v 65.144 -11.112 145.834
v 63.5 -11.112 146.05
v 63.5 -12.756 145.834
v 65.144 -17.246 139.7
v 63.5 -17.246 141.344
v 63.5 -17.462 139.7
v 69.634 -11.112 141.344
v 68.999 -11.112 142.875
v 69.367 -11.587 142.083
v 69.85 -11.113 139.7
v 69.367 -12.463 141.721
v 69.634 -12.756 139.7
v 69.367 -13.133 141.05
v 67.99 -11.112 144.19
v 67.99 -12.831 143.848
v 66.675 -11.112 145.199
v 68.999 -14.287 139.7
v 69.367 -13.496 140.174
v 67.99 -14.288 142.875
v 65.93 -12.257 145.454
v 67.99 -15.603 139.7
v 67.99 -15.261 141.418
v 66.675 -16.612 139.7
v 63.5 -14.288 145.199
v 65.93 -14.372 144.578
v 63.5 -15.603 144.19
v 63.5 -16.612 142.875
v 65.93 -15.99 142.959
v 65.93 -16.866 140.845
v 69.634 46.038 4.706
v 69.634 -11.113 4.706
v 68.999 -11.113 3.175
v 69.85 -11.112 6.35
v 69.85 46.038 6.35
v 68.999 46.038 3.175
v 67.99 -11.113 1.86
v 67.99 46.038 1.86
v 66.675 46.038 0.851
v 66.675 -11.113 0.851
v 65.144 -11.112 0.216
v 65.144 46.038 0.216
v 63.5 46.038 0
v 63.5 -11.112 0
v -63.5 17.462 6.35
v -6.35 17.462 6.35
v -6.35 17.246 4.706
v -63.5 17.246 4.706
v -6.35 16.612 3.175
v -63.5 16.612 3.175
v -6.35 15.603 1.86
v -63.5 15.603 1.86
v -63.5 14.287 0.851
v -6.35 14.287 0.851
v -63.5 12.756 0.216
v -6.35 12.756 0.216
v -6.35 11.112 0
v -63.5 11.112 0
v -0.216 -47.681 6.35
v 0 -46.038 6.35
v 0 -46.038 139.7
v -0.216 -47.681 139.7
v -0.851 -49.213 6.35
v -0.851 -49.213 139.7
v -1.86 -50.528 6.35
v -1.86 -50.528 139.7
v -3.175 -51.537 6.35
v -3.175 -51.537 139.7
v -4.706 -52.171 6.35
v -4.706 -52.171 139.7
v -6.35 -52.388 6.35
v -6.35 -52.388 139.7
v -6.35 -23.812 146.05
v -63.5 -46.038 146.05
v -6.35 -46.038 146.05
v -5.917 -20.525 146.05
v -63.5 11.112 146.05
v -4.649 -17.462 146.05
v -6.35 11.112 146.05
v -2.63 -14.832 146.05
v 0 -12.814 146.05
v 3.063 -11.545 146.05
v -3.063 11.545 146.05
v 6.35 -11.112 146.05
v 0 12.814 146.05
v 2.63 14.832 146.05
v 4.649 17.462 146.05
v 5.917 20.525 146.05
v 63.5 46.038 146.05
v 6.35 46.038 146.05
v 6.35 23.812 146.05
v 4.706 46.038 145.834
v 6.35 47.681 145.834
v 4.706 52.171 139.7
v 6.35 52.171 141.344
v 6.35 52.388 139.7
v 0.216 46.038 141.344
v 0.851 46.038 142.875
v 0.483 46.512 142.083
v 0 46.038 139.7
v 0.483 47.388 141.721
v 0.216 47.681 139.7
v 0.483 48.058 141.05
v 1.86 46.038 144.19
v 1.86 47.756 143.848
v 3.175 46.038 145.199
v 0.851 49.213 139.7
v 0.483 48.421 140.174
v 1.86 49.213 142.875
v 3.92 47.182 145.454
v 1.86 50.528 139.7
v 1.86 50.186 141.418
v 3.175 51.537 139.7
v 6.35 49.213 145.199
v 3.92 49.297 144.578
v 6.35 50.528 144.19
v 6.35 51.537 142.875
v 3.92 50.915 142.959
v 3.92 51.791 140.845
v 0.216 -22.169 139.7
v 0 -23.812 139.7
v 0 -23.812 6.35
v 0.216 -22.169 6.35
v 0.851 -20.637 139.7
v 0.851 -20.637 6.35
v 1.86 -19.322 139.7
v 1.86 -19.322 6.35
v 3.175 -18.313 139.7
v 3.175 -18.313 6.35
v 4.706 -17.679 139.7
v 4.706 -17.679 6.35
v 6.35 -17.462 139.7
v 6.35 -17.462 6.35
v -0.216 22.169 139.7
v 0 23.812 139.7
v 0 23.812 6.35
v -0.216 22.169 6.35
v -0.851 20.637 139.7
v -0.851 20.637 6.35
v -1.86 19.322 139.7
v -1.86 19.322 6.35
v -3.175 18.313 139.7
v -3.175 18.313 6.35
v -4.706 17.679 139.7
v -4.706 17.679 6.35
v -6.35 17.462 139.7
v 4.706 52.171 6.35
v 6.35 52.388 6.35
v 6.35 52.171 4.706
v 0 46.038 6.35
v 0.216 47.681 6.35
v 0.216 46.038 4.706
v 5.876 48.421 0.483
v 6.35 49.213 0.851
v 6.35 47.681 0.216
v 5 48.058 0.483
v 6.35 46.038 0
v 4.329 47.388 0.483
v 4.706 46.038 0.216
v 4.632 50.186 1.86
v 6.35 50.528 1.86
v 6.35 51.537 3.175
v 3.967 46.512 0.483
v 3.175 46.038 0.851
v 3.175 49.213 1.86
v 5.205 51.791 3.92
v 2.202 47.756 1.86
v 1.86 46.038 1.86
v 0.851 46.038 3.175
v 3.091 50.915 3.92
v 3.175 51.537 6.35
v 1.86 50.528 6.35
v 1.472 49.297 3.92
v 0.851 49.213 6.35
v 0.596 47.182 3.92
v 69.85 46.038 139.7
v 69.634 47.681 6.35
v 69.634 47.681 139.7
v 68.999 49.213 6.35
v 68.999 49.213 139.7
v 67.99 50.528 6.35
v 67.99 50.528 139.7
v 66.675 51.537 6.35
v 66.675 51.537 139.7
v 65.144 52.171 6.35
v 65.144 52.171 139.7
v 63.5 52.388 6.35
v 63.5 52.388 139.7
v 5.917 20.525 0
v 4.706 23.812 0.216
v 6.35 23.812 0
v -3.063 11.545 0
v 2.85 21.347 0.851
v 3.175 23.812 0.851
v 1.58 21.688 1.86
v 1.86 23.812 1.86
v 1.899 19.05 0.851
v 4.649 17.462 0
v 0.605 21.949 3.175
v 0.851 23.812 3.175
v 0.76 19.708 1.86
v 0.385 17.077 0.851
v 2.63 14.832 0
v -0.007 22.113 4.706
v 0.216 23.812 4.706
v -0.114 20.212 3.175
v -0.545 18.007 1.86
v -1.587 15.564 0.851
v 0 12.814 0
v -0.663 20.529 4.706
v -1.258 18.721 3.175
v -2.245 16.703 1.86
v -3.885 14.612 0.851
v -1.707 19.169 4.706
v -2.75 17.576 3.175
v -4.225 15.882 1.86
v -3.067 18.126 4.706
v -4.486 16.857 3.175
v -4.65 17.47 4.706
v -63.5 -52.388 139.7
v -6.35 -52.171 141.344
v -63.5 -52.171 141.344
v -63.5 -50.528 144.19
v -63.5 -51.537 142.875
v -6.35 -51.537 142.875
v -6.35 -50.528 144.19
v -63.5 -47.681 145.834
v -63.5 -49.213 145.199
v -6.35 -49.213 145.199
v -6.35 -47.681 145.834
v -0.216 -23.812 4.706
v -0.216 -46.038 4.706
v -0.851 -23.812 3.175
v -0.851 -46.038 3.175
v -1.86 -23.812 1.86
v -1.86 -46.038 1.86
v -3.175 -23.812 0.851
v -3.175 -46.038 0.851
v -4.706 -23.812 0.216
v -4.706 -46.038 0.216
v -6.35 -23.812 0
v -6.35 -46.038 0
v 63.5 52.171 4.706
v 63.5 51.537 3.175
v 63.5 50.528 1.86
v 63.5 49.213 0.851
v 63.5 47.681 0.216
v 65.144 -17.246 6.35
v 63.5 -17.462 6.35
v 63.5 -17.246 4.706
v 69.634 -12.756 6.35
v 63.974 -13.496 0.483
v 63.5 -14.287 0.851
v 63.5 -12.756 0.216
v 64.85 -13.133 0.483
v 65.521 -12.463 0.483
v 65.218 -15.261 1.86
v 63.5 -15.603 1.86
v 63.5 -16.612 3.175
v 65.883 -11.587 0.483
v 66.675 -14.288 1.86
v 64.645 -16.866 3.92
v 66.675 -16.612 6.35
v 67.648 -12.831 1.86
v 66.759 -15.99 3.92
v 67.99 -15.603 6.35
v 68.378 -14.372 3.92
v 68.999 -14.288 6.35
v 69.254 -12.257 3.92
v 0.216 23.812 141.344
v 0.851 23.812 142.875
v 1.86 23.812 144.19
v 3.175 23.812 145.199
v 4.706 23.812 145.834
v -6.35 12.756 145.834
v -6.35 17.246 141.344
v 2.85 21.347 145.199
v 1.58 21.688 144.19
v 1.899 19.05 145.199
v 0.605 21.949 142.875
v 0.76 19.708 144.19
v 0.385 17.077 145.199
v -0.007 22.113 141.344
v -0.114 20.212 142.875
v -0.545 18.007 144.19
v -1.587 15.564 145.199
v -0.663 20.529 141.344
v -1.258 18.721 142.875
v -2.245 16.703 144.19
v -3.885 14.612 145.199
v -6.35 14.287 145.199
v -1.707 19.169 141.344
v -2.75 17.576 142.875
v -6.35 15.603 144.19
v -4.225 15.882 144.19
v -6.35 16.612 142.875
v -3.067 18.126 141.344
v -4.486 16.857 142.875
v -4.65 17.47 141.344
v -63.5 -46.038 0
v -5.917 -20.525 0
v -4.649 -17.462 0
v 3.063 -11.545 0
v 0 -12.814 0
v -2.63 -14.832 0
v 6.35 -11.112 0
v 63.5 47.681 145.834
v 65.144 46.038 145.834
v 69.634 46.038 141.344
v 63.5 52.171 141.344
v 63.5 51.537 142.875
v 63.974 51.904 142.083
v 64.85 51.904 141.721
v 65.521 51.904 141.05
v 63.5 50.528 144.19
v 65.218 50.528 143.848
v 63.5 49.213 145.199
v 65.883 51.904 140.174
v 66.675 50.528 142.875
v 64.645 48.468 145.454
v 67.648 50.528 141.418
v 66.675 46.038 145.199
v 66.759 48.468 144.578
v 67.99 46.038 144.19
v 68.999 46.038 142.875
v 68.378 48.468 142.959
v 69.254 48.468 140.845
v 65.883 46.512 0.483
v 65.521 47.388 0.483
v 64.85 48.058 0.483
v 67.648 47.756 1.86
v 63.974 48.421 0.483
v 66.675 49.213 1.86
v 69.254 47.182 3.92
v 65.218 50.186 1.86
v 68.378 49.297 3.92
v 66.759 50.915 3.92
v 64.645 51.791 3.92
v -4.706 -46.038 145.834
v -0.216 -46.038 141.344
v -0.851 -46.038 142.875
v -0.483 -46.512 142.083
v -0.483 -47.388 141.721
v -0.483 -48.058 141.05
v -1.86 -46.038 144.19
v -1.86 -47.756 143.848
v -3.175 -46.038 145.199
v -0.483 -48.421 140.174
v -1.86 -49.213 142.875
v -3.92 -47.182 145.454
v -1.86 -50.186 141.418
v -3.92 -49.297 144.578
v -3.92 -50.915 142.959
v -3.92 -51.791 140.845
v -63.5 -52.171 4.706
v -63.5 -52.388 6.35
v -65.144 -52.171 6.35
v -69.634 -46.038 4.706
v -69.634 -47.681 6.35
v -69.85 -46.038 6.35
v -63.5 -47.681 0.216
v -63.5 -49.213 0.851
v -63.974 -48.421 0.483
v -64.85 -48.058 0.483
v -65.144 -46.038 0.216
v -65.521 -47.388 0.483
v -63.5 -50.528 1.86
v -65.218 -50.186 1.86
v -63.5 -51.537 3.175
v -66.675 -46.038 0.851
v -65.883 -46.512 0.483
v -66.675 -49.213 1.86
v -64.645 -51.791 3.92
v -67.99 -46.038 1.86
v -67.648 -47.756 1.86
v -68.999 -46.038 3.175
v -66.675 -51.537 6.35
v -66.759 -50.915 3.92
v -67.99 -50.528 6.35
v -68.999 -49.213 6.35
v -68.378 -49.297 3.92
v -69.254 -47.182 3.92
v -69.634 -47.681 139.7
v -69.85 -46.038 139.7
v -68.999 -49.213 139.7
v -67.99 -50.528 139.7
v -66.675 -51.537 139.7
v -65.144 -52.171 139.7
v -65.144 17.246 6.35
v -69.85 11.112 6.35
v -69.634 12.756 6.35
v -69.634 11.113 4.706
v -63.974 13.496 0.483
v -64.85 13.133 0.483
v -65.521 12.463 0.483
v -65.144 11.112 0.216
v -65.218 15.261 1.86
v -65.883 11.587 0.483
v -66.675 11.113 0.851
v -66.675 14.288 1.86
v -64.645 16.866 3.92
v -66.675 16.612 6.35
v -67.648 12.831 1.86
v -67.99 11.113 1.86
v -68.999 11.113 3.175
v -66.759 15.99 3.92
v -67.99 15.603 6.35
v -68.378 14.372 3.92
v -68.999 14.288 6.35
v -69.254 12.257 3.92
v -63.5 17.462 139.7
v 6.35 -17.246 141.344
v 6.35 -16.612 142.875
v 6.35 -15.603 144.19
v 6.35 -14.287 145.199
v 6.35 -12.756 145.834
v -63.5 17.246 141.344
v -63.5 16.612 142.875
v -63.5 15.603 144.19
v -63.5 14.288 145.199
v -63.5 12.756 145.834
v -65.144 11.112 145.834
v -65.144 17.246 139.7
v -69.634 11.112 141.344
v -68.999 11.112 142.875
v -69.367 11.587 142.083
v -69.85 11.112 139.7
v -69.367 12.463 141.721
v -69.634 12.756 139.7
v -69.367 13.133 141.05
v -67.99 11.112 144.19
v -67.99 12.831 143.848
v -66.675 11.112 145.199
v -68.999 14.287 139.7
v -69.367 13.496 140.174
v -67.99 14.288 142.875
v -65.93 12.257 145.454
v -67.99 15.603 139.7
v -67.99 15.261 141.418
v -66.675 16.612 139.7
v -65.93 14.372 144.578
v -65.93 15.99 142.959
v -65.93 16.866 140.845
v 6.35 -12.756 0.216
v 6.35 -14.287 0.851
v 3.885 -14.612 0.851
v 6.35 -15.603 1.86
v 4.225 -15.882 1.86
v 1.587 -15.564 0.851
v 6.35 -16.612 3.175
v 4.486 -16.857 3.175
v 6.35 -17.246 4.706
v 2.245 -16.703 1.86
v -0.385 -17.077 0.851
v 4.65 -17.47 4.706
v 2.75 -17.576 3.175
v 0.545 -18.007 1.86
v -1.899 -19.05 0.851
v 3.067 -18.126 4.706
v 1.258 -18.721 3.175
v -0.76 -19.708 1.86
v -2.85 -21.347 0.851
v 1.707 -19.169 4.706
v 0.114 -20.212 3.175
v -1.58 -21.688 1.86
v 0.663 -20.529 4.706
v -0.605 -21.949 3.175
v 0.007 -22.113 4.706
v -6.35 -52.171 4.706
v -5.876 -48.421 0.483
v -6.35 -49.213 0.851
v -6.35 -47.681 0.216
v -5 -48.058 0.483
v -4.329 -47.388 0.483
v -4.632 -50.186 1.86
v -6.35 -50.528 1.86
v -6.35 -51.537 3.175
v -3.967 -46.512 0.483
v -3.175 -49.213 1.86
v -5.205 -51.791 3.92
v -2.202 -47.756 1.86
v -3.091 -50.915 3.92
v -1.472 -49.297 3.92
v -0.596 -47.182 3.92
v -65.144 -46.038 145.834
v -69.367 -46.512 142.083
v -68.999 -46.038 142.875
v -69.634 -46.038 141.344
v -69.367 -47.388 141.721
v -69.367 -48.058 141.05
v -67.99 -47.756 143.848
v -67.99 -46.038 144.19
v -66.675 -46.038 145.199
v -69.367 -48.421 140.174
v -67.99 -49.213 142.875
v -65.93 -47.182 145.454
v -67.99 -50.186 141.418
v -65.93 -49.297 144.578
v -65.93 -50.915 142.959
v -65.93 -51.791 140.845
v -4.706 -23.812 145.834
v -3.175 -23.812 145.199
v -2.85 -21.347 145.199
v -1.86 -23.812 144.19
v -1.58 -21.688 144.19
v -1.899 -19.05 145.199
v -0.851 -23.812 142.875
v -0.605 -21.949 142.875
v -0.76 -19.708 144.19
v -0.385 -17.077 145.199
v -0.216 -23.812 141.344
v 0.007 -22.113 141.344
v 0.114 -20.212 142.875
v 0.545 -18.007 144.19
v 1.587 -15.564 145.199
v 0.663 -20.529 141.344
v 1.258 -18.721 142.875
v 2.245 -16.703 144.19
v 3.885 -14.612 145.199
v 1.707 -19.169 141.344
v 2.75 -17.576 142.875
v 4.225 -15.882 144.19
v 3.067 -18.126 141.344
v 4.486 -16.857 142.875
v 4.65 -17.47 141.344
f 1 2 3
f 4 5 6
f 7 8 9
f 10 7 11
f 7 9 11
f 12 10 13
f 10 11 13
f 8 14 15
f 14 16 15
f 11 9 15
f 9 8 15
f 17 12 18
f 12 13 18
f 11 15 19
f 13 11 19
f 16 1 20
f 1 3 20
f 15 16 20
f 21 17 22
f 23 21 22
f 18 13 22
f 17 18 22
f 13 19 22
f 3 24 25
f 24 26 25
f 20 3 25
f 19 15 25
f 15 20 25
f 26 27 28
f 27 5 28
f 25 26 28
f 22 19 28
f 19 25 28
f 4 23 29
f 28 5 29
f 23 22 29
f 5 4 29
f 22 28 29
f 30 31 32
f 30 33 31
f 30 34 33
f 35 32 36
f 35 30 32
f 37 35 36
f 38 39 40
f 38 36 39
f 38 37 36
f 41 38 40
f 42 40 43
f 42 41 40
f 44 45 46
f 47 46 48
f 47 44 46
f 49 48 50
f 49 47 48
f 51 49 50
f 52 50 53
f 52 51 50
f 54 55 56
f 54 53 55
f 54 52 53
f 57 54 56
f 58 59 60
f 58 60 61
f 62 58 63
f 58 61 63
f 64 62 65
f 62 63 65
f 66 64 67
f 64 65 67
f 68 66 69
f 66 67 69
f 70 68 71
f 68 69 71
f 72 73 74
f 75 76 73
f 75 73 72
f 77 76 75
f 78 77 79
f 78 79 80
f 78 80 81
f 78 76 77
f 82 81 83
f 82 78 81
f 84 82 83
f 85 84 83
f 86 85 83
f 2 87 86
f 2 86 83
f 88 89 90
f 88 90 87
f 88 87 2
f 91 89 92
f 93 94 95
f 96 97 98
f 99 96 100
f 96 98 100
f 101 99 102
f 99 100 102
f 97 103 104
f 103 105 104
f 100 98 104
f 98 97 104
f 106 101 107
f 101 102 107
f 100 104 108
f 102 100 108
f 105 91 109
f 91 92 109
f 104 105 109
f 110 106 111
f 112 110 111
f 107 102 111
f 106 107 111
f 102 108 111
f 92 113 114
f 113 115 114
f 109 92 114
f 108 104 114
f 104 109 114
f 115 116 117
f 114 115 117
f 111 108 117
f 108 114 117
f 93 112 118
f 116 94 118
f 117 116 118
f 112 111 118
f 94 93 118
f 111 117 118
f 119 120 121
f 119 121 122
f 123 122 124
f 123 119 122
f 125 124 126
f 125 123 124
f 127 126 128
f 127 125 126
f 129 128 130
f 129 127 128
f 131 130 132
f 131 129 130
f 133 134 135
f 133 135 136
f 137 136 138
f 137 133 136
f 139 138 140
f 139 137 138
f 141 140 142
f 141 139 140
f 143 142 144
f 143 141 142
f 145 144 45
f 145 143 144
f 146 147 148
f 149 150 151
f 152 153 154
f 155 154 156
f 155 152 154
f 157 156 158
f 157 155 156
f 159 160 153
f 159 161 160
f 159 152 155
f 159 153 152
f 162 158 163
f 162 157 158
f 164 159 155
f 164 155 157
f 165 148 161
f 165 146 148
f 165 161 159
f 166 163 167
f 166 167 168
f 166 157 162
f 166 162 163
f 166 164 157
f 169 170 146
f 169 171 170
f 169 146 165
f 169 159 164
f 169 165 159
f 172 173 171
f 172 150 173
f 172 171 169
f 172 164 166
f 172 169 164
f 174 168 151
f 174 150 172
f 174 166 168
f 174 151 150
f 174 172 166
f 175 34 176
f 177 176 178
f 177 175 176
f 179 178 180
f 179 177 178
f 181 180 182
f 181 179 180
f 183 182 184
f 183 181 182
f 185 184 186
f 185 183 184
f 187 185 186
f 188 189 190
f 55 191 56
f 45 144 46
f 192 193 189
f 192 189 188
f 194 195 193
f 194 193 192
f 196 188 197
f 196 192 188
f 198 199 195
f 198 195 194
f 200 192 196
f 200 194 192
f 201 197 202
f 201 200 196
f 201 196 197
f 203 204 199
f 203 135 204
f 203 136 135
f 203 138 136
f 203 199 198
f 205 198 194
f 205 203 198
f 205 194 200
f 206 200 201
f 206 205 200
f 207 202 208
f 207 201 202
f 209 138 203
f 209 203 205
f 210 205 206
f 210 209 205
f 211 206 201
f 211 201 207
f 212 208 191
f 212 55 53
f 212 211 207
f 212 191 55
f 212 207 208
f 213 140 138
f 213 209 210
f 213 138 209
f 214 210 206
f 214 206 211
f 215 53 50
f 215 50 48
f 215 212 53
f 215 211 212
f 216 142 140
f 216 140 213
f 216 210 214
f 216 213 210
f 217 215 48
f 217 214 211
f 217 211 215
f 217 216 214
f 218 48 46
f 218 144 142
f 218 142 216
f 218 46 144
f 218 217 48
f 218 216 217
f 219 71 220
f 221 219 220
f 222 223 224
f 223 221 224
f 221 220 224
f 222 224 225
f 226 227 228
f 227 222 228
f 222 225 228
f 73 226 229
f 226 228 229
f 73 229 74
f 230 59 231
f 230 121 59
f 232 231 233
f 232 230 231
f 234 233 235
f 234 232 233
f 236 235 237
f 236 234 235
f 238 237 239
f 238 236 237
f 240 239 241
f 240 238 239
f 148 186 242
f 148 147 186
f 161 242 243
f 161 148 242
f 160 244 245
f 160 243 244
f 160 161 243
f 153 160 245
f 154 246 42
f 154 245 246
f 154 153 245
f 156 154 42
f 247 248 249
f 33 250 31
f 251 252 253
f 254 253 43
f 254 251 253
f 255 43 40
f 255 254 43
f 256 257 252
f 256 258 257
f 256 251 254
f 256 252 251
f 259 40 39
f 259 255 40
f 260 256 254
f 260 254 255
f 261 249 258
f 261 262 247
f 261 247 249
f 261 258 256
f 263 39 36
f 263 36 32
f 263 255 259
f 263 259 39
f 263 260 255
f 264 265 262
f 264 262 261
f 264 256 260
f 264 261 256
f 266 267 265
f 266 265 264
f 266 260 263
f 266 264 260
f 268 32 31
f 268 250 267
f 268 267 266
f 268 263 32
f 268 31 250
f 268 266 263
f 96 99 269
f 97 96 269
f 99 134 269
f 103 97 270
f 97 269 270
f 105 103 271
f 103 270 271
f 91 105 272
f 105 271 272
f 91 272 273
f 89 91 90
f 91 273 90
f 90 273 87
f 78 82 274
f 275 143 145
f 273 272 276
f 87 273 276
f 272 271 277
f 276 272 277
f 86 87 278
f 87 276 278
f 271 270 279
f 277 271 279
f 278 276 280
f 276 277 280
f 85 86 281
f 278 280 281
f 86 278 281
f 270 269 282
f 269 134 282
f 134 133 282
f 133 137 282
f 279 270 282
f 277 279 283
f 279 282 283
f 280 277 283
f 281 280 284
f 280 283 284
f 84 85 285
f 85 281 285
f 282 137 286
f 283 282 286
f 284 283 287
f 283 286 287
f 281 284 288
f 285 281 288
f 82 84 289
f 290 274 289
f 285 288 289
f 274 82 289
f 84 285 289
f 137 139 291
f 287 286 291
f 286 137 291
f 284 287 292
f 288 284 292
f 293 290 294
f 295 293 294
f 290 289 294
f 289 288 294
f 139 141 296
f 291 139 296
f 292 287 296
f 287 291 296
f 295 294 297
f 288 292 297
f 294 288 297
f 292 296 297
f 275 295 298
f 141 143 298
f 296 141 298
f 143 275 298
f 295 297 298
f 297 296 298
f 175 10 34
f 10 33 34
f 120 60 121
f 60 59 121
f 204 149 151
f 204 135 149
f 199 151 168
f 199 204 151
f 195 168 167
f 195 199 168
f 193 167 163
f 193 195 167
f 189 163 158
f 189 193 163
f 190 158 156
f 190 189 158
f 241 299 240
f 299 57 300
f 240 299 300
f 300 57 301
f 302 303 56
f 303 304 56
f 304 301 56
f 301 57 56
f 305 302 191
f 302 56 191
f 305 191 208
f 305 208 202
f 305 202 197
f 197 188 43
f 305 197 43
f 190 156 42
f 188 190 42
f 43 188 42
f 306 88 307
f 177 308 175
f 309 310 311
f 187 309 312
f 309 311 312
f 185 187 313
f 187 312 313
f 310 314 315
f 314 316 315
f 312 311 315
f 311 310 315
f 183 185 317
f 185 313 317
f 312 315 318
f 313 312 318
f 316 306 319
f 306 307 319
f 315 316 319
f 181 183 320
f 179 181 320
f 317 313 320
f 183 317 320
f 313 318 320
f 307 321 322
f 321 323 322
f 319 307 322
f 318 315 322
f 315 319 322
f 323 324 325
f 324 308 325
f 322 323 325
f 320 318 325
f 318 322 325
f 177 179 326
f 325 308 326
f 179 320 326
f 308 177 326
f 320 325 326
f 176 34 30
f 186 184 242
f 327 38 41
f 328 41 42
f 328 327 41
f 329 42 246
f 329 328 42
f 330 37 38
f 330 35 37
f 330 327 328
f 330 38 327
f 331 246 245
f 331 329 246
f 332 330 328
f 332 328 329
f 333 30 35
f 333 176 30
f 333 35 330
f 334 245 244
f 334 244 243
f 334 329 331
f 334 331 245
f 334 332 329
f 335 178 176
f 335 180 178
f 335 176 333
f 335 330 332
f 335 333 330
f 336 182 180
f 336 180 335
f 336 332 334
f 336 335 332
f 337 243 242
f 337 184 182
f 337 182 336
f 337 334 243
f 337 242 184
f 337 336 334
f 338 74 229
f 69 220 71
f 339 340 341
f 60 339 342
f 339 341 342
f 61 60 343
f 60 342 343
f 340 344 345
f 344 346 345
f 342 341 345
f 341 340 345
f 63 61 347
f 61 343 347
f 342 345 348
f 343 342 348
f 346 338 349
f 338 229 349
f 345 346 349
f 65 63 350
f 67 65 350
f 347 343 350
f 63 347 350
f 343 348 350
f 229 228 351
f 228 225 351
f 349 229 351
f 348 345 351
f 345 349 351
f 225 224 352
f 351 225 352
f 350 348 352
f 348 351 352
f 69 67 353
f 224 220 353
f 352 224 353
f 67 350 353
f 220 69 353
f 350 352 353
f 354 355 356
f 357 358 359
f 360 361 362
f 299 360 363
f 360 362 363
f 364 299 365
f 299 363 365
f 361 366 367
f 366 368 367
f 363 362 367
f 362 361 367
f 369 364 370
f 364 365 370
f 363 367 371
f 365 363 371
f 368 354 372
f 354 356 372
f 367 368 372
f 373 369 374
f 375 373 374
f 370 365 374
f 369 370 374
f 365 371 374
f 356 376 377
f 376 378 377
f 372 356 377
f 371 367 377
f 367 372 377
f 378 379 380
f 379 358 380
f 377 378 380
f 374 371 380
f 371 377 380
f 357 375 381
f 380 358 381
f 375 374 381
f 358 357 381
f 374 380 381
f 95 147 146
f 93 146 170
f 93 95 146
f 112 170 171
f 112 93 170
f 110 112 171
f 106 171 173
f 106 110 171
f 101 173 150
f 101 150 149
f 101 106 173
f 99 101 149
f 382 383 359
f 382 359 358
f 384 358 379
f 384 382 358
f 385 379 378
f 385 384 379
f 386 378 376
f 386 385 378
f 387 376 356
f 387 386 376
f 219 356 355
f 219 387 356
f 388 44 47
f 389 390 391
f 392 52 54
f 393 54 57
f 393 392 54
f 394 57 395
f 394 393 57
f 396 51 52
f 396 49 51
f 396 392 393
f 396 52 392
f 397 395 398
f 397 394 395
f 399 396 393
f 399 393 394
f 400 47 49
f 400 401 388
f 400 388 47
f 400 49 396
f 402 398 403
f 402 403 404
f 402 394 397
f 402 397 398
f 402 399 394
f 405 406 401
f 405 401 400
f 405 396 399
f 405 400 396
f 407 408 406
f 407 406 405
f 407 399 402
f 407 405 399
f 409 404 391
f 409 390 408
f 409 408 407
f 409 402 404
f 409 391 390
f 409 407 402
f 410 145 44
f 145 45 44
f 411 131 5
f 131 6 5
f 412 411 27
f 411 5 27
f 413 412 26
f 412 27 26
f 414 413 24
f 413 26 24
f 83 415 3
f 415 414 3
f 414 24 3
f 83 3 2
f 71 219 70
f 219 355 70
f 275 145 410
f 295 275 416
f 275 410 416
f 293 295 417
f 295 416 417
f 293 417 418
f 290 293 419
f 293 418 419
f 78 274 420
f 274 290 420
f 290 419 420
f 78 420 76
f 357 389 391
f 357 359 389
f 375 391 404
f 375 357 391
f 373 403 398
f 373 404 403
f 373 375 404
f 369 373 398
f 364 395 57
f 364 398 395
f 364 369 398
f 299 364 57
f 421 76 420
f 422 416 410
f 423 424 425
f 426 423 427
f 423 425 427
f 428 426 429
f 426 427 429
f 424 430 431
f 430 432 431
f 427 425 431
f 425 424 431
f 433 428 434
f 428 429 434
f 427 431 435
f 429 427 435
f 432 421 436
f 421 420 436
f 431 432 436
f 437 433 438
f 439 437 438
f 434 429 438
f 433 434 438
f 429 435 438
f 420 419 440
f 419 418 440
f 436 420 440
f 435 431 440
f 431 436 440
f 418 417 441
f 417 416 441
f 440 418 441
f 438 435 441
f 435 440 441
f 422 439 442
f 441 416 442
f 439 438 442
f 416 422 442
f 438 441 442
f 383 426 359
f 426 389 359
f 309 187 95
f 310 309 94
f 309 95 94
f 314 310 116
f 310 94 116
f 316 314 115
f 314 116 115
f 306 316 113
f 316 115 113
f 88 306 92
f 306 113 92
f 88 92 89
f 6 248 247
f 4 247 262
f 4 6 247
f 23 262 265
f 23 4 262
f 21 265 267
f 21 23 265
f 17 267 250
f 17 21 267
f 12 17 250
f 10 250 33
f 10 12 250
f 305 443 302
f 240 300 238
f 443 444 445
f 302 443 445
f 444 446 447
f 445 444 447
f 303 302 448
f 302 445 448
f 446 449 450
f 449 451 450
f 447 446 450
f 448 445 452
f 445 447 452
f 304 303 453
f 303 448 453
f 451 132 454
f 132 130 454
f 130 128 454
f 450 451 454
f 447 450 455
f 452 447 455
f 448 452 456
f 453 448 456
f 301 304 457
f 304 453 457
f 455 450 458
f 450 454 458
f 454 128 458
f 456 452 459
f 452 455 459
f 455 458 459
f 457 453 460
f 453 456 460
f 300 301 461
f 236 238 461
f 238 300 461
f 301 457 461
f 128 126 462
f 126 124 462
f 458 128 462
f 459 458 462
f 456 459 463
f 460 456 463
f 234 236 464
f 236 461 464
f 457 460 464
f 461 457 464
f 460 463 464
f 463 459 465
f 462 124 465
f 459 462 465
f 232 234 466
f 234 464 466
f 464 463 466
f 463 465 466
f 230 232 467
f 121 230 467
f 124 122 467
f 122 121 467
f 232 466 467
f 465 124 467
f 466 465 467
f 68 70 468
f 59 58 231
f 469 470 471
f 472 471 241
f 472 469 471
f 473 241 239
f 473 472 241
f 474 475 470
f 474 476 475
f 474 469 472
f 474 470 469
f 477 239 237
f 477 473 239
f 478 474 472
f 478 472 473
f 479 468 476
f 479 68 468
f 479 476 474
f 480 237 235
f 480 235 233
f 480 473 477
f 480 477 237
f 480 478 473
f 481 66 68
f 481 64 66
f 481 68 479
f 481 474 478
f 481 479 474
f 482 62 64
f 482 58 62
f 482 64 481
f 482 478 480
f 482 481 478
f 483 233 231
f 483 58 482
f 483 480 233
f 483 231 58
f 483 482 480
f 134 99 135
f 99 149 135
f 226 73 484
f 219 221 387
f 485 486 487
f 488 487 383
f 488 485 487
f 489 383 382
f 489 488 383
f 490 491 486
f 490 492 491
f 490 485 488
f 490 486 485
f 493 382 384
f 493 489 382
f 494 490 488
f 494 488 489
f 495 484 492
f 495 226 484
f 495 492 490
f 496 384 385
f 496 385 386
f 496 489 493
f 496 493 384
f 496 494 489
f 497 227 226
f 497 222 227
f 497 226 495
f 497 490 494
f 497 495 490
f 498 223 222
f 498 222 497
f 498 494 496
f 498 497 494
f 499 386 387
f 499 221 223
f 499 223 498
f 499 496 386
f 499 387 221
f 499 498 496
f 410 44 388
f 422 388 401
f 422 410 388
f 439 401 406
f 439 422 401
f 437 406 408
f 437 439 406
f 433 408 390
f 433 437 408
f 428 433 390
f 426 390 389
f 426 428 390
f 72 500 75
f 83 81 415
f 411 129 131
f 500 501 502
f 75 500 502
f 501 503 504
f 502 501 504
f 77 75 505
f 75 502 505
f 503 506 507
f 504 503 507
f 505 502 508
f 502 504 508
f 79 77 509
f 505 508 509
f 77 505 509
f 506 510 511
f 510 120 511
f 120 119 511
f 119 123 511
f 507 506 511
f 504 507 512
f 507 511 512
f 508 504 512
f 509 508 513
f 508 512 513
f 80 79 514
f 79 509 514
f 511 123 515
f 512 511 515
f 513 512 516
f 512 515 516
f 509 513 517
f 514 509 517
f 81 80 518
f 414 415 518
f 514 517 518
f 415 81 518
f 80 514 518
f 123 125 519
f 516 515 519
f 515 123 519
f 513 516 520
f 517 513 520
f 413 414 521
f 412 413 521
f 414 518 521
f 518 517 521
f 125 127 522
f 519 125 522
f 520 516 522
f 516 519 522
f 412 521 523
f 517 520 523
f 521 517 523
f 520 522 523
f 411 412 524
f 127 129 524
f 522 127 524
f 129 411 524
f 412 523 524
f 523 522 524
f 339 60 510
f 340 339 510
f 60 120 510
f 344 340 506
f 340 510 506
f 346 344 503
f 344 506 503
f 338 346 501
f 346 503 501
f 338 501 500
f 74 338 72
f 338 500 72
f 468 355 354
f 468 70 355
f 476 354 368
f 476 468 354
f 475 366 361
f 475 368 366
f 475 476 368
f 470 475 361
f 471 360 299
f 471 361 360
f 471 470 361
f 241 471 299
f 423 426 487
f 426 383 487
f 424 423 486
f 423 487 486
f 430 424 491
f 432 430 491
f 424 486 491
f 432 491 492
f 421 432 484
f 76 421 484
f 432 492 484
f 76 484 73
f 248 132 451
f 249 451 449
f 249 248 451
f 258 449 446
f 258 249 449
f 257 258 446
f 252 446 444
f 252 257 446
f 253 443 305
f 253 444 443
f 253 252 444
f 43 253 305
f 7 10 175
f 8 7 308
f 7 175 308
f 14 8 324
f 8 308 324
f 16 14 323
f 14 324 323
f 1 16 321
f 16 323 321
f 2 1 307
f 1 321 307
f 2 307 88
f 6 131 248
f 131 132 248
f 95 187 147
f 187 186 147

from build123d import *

# Parameters (mm, degrees)
F1_DEPTH = 146.05
F2_R     = 6.35


with BuildPart() as f1:
    # F0 (on Top) → F1 (new body)
    with BuildSketch(Plane.XY):
        Polygon((0, -52.3875), (0, -17.4625), (69.85, -17.4625), (69.85, 52.3875), (0, 52.3875), (0, 17.4625), (-69.85, 17.4625), (-69.85, -52.3875), align=None)
    extrude(amount=F1_DEPTH)

    # F2
    f2_edges = [f1.edges().sort_by_distance(p)[0] for p in [
        (-34.925, -52.3875, 146.05),
        (0, -34.925, 146.05),
        (34.925, -17.4625, 146.05),
        (69.85, 17.4625, 146.05),
        (34.925, 52.3875, 146.05),
        (0, 34.925, 146.05),
        (-34.925, 17.4625, 146.05),
        (-69.85, -17.4625, 146.05),
        (-69.85, -52.3875, 73.025),
        (0, -52.3875, 73.025),
        (-34.925, -52.3875, 0),
        (0, -17.4625, 73.025),
        (69.85, -17.4625, 73.025),
        (34.925, -17.4625, 0),
        (69.85, 52.3875, 73.025),
        (69.85, 17.4625, 0),
        (0, 52.3875, 73.025),
        (34.925, 52.3875, 0),
        (0, 17.4625, 73.025),
        (0, 34.925, 0),
        (-69.85, 17.4625, 73.025),
        (-34.925, 17.4625, 0),
        (-69.85, -17.4625, 0),
        (0, -34.925, 0),
    ]]
    fillet(f2_edges, radius=F2_R)


solid = f1.part
